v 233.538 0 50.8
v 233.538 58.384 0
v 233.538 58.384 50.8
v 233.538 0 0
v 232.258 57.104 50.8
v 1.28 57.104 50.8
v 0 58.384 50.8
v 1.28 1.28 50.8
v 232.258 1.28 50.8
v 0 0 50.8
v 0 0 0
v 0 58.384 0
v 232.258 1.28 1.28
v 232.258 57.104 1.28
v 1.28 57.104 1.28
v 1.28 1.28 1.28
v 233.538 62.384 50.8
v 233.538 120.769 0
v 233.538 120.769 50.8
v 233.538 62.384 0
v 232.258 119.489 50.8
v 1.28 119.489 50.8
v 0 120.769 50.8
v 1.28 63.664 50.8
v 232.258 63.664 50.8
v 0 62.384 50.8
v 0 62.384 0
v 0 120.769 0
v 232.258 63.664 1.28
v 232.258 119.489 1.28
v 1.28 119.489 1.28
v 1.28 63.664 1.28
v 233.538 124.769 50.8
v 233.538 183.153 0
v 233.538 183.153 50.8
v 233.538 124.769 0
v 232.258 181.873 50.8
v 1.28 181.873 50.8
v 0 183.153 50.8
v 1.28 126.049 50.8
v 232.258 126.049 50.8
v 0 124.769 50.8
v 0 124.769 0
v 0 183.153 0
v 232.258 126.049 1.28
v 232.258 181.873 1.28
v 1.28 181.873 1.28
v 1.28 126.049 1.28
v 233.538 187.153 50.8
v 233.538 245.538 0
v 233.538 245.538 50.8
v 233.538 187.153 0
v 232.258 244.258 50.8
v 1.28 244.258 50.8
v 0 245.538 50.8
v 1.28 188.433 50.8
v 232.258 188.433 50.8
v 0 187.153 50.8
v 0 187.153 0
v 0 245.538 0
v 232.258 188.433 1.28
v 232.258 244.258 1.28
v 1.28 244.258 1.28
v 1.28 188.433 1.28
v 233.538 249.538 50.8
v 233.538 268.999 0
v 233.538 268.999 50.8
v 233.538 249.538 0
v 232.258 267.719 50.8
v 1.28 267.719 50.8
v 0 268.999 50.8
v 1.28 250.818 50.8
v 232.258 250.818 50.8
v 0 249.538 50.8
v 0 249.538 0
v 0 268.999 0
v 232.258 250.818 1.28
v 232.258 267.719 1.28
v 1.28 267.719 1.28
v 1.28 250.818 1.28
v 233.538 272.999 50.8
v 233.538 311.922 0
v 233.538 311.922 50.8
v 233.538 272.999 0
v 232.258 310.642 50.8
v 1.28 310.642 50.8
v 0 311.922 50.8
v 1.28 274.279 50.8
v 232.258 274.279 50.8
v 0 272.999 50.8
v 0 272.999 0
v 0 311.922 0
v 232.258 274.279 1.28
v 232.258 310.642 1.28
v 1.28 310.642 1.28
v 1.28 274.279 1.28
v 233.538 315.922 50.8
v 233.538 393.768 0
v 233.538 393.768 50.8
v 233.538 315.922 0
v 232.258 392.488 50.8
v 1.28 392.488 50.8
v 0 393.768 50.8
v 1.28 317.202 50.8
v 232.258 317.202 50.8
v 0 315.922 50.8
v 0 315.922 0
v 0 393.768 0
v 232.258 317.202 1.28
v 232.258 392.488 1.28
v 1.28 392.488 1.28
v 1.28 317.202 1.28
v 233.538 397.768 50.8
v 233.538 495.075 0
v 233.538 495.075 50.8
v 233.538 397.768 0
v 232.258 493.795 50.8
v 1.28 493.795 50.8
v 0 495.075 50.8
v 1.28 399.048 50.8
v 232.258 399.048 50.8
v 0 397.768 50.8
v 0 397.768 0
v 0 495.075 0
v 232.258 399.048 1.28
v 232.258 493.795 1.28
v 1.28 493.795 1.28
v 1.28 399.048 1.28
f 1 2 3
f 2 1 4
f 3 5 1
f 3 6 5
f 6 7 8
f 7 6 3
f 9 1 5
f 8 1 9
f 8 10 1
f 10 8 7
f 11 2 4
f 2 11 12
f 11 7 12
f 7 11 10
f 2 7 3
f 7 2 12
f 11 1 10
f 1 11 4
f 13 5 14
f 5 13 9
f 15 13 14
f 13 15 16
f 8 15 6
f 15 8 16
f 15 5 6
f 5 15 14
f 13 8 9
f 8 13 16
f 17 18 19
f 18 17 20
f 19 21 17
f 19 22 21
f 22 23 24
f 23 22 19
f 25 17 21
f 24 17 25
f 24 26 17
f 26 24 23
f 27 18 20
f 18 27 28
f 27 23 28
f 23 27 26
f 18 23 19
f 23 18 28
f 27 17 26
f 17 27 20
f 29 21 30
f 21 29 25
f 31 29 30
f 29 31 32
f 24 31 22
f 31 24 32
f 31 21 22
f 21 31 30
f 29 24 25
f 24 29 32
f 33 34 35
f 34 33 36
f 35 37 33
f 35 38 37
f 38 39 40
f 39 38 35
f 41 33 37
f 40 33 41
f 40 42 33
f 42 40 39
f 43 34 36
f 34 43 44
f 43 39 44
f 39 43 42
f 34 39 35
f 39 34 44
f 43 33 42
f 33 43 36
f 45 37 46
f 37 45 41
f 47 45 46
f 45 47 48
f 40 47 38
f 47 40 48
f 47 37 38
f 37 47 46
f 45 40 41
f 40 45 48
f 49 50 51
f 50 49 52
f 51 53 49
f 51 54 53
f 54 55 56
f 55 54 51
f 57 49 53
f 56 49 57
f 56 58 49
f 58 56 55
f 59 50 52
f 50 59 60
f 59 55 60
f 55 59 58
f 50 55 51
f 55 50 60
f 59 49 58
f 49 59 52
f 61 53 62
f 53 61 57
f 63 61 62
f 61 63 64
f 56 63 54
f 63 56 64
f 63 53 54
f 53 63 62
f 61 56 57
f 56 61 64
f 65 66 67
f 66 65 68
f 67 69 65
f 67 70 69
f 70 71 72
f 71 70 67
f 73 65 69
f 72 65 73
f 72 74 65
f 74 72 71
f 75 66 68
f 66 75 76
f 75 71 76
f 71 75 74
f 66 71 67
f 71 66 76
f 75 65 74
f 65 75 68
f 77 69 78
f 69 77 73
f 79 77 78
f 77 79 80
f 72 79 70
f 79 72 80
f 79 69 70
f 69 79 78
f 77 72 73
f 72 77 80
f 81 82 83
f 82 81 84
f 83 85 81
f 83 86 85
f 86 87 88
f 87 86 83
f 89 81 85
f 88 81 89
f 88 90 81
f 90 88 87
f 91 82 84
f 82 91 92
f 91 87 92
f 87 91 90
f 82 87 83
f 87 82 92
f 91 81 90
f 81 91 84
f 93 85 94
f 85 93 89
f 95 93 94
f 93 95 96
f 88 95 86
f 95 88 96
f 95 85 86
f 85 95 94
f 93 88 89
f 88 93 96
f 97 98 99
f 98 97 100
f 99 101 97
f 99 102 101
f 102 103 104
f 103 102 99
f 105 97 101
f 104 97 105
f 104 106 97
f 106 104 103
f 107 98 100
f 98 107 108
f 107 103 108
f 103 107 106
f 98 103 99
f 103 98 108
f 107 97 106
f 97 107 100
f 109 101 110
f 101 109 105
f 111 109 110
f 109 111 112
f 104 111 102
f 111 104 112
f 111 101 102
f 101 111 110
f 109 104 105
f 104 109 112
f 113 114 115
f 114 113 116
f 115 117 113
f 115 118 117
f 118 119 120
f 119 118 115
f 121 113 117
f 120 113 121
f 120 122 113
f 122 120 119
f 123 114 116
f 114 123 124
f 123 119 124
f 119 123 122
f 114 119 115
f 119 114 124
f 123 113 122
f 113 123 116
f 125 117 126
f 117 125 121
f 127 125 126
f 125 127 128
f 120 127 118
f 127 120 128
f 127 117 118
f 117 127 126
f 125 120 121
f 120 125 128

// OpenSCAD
//measurements
in_width = 9.3125;
//design parameters
thin_wall_thickness = 1.28;
n_splits = 12;
height_inch = 2.00;
widths1 = [3,3,3,3];
widths2 = [1,2,4,5];
//constants
inch = 25.4;
//calculated
twt = thin_wall_thickness;
depth = (in_width * inch - 3);
widths = [each widths1, each widths2]*depth/n_splits;
offsets = [0, each cumsum(widths)];
height = height_inch * inch;

function cumsum(values) =  [ for (a=0, b=values[0]; a < len(values); a= a+1, b=b+(values[a]==undef?0:values[a])) b];

echo( cumsum(widths))
for (i=[0:len(widths)-1]){
  width=widths[i];
  offset=offsets[i];
  lwh_outer = [depth, width,height];
  lwh_inner = lwh_outer - 2 * twt* [1, 1, 0];
  translate([0,offset+4*i,0]) difference(){
    cube(lwh_outer);
    translate([twt, twt, twt]) cube(lwh_inner);
  }
}
